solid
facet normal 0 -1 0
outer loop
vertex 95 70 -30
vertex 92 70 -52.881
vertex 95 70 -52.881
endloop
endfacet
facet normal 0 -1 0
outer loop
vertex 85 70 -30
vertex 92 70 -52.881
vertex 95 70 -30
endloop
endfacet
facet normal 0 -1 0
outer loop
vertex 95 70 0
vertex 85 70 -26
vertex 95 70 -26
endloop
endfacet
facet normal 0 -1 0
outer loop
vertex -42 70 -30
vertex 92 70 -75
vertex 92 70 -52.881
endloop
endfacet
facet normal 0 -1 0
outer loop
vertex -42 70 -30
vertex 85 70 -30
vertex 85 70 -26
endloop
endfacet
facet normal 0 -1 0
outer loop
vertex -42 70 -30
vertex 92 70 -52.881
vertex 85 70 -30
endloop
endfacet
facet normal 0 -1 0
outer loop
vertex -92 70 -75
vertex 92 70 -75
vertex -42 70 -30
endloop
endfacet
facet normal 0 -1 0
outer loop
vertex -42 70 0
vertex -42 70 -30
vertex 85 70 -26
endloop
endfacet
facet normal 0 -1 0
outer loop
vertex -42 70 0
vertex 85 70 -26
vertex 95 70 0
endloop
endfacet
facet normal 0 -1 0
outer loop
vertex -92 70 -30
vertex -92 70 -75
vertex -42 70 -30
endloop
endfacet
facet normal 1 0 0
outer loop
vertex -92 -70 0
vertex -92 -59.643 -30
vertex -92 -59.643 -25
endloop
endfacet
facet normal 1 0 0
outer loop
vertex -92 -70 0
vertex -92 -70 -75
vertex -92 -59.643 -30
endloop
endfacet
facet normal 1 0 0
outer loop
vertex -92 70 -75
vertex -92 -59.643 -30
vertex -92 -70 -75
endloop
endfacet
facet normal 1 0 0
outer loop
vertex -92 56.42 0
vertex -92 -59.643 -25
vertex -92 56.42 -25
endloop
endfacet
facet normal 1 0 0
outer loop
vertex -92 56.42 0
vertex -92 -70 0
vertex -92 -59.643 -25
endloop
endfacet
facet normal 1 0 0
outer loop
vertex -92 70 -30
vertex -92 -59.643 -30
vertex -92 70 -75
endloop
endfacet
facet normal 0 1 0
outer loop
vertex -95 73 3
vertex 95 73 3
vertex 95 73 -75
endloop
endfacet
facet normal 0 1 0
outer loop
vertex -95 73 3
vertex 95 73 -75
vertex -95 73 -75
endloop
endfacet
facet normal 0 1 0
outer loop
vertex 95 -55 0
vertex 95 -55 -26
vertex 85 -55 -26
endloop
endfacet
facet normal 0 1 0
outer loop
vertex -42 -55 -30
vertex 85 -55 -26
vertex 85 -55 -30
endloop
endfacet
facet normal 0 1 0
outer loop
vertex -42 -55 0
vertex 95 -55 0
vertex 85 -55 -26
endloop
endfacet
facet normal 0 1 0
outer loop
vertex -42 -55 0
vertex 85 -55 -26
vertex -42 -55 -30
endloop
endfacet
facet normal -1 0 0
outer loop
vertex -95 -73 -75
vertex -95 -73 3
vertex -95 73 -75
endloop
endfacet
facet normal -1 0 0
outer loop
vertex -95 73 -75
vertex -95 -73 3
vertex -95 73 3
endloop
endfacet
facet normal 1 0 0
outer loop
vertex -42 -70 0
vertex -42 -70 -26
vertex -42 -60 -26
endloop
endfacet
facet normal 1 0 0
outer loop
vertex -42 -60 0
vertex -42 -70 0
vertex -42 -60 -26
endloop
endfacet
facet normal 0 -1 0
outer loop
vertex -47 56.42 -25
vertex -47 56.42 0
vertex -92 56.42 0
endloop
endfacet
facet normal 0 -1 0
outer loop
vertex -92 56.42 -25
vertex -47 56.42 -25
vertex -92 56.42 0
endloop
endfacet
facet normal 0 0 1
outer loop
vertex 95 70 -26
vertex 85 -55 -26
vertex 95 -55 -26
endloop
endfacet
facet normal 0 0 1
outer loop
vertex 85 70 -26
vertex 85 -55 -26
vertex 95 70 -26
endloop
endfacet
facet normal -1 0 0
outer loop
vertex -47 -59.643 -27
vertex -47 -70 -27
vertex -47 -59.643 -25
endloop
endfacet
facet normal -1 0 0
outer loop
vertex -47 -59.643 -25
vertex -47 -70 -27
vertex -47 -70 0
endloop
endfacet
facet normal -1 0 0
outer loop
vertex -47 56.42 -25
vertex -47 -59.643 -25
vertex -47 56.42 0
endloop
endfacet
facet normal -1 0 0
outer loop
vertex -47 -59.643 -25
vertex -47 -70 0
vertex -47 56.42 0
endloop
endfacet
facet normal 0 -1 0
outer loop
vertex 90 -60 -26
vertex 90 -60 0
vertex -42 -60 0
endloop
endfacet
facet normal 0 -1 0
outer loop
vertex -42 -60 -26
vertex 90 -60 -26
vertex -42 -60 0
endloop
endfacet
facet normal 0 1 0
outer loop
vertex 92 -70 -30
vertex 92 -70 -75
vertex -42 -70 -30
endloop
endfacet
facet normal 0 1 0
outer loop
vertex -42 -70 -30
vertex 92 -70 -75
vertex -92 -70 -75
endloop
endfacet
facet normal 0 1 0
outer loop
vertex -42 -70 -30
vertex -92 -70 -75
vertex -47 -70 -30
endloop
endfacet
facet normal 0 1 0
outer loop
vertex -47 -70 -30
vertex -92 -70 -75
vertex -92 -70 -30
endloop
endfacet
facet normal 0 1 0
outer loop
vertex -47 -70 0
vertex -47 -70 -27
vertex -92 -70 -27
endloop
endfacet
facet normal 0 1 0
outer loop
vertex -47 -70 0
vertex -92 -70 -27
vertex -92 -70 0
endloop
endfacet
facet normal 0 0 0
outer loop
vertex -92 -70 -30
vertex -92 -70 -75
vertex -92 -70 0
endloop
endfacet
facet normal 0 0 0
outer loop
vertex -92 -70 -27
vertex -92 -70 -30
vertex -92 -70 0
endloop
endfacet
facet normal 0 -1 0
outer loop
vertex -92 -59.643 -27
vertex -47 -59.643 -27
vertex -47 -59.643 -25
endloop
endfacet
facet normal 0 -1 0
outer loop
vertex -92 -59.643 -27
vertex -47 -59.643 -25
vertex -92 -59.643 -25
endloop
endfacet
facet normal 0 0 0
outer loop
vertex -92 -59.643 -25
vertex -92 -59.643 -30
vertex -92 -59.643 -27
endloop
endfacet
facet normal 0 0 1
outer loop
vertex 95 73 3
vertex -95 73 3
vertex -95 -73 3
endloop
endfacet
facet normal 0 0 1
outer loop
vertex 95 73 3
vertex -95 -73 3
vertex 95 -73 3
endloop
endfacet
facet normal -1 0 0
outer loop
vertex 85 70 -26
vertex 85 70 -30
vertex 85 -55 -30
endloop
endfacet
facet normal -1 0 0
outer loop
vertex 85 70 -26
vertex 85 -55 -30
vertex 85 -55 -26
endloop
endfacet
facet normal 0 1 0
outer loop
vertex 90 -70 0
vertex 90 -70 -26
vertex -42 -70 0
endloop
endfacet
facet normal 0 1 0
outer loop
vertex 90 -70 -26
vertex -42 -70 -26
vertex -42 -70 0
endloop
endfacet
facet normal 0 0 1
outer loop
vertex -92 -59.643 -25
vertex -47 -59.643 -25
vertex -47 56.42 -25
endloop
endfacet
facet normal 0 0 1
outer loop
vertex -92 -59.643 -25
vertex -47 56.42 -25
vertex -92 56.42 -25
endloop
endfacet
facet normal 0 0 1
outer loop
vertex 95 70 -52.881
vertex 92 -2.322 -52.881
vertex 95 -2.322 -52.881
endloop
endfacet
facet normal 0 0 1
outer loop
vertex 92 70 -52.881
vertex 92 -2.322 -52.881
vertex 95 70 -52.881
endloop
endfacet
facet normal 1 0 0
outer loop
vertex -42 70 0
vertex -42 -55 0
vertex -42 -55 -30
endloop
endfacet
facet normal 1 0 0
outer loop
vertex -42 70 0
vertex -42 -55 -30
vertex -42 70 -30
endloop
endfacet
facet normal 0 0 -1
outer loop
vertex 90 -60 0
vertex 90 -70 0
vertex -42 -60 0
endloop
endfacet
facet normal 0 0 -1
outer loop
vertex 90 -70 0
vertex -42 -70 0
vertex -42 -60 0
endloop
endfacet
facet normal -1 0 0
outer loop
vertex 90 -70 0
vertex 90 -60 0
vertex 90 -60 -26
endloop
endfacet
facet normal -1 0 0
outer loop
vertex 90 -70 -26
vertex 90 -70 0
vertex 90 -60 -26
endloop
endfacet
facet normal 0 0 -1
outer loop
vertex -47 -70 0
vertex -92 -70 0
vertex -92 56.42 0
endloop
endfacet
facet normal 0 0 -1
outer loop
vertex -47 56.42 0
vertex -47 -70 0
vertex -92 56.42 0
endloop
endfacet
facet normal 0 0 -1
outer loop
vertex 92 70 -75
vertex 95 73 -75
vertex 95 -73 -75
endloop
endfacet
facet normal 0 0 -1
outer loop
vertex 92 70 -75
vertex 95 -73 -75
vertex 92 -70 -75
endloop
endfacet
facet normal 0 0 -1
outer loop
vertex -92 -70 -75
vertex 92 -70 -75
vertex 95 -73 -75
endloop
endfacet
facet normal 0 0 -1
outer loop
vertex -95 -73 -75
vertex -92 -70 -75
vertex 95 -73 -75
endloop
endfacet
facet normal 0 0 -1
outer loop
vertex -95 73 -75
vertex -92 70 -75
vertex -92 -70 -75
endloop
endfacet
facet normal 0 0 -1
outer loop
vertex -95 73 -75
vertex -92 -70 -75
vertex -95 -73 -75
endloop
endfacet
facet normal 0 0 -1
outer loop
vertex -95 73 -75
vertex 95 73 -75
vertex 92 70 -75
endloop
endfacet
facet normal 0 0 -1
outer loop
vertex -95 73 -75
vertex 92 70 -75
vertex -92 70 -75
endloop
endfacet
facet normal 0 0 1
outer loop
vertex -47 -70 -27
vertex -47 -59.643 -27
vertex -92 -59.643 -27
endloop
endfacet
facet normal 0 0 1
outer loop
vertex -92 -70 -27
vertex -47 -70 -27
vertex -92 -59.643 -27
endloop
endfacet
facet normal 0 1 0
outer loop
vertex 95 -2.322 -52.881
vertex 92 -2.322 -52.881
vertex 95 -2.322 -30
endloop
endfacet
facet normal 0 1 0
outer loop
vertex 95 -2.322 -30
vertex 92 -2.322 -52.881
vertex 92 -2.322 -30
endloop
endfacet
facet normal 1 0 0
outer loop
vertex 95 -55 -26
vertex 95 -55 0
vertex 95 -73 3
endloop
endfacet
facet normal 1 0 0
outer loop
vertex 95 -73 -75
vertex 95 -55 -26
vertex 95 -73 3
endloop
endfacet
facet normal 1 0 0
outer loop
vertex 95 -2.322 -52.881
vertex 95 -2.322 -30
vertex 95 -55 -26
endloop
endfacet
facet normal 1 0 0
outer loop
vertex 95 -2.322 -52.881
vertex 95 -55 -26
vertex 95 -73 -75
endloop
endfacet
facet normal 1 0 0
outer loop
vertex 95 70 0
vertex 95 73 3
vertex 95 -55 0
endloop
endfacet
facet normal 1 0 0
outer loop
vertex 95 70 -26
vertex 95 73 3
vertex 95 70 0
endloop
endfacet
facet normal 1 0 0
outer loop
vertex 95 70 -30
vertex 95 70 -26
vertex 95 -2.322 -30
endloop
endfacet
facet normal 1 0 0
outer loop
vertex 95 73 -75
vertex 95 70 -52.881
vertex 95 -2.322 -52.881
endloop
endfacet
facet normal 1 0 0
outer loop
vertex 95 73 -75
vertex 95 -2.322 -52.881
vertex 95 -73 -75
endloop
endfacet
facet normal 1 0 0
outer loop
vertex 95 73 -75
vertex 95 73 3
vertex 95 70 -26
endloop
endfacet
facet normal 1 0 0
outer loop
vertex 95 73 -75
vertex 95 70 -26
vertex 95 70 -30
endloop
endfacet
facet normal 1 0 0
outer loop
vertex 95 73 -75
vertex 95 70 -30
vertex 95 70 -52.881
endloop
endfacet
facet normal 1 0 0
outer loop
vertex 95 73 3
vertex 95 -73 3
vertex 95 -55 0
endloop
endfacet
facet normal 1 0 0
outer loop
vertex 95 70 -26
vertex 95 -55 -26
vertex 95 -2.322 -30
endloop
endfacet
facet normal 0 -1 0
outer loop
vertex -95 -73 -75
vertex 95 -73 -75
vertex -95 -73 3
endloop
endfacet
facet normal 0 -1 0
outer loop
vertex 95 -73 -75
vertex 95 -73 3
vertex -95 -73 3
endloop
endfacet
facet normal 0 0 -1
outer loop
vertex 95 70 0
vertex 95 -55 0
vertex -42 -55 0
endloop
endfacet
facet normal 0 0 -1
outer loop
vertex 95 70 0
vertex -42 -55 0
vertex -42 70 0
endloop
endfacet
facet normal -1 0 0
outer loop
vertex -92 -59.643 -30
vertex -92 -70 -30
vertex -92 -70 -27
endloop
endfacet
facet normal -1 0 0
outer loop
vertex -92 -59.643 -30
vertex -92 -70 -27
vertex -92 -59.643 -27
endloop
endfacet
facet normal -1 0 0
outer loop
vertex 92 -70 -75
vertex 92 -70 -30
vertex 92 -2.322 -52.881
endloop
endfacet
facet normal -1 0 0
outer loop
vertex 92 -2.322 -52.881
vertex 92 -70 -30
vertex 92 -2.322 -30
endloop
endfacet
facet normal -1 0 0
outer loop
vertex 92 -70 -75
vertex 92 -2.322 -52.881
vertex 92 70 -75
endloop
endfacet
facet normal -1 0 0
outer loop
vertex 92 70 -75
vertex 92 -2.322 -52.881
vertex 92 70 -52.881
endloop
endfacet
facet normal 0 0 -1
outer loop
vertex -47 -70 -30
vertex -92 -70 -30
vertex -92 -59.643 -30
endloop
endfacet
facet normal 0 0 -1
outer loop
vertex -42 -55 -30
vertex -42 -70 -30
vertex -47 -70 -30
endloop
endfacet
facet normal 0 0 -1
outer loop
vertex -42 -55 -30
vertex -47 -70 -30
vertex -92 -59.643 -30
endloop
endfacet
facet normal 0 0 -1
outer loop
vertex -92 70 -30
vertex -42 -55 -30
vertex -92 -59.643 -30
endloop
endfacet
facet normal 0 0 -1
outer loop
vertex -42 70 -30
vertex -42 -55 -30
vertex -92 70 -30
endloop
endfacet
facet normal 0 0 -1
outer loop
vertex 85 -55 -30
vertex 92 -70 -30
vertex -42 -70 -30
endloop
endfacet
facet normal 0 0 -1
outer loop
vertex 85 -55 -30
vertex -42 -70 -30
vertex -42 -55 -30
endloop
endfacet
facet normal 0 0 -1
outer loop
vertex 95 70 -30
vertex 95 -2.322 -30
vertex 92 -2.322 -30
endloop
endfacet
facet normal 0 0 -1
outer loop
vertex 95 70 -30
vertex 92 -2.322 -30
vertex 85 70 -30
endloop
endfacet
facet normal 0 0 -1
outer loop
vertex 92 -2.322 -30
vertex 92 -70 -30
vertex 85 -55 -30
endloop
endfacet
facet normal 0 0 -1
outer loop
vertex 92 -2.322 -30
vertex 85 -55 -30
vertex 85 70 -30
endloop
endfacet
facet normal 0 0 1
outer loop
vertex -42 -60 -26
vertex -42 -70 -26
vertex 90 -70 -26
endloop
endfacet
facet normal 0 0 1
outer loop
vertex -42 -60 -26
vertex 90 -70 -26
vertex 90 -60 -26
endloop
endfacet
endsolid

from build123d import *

# Parameters (mm, degrees)
ESQUISSE3_W             = 190
ESQUISSE3_H             = 146
BOSS_EXTRU_3_DEPTH      = 3
ESQUISSE4_W             = 190
ESQUISSE4_H             = 3
BOSS_EXTRU_4_DEPTH      = 75
ESQUISSE5_W             = 190
ESQUISSE5_H             = 3
BOSS_EXTRU_5_DEPTH      = 75
ESQUISSE6_W             = 3
ESQUISSE6_H             = 140
BOSS_EXTRU_6_DEPTH      = 75
ESQUISSE7_W             = 3
ESQUISSE7_H             = 140
BOSS_EXTRU_7_DEPTH      = 75
ESQUISSE8_W             = 26
ESQUISSE8_H             = 140
ENL_V_MAT_EXTRU_1_DEPTH = 5
ESQUISSE9_W             = 50
ESQUISSE9_H             = 13.580457403
BOSS_EXTRU_8_DEPTH      = 30
ESQUISSE10_W            = 5
ESQUISSE10_H            = 126.419542597
BOSS_EXTRU_9_DEPTH      = 30
ESQUISSE12_W            = 45
ESQUISSE12_H            = 116.062132341
BOSS_EXTRU_10_DEPTH     = 5
ESQUISSE13_W            = 137
ESQUISSE13_H            = 5
BOSS_EXTRU_11_DEPTH     = 30
ESQUISSE14_W            = 134
ESQUISSE14_H            = 10
BOSS_EXTRU_12_DEPTH     = 4
ESQUISSE15_W            = 26
ESQUISSE15_H            = 10
BOSS_EXTRU_13_DEPTH     = 5
ESQUISSE16_W            = 4
ESQUISSE16_H            = 125
BOSS_EXTRU_14_DEPTH     = 7
ESQUISSE17_W            = 22.881021534
ESQUISSE17_H            = 72.322375242
ENL_V_MAT_EXTRU_2_DEPTH = 3
ESQUISSE19_W            = 44.999866494
ESQUISSE19_H            = 10.48475091
BOSS_EXTRU_15_DEPTH     = 3


with BuildPart() as part:
    # Esquisse3 → Boss.-Extru.3 (new body)
    with BuildSketch(Plane.XY):
        Rectangle(ESQUISSE3_W, ESQUISSE3_H)
    extrude(amount=BOSS_EXTRU_3_DEPTH)

    # Esquisse4 → Boss.-Extru.4 (add)
    with BuildSketch(Plane(origin=(0, 0, 0), x_dir=(-1, 0, 0), z_dir=(0, 0, -1))):
        with Locations((0, -71.5)):
            Rectangle(ESQUISSE4_W, ESQUISSE4_H)
    extrude(amount=BOSS_EXTRU_4_DEPTH)

    # Esquisse5 → Boss.-Extru.5 (add)
    with BuildSketch(Plane(origin=(0, 0, 0), x_dir=(-1, 0, 0), z_dir=(0, 0, -1))):
        with Locations((0, 71.5)):
            Rectangle(ESQUISSE5_W, ESQUISSE5_H)
    extrude(amount=BOSS_EXTRU_5_DEPTH)

    # Esquisse6 → Boss.-Extru.6 (add)
    with BuildSketch(Plane(origin=(0, 0, 0), x_dir=(-1, 0, 0), z_dir=(0, 0, -1))):
        with Locations((93.5, 0)):
            Rectangle(ESQUISSE6_W, ESQUISSE6_H)
    extrude(amount=BOSS_EXTRU_6_DEPTH)

    # Esquisse7 → Boss.-Extru.7 (add)
    with BuildSketch(Plane(origin=(0, 0, 0), x_dir=(-1, 0, 0), z_dir=(0, 0, -1))):
        with Locations((-93.5, 0)):
            Rectangle(ESQUISSE7_W, ESQUISSE7_H)
    extrude(amount=BOSS_EXTRU_7_DEPTH)

    # Esquisse8 → Enlèv. mat.-Extru.1 (cut)
    with BuildSketch(Plane.ZY.offset(-92)):
        with Locations((-13, 0)):
            Rectangle(ESQUISSE8_W, ESQUISSE8_H)
    extrude(amount=-ENL_V_MAT_EXTRU_1_DEPTH, mode=Mode.SUBTRACT)

    # Esquisse9 → Boss.-Extru.8 (add)
    with BuildSketch(Plane(origin=(0, 0, 0), x_dir=(-1, 0, 0), z_dir=(0, 0, -1))):
        with Locations((67, 63.209771299)):
            Rectangle(ESQUISSE9_W, ESQUISSE9_H)
    extrude(amount=BOSS_EXTRU_8_DEPTH)

    # Esquisse10 → Boss.-Extru.9 (add)
    with BuildSketch(Plane(origin=(0, 0, 0), x_dir=(-1, 0, 0), z_dir=(0, 0, -1))):
        with Locations((44.5, -6.790228701)):
            Rectangle(ESQUISSE10_W, ESQUISSE10_H)
    extrude(amount=BOSS_EXTRU_9_DEPTH)

    # Esquisse12 → Boss.-Extru.10 (add)
    with BuildSketch(Plane(origin=(0, 0, -30), x_dir=(-1, 0, 0), z_dir=(0, 0, -1))):
        with Locations((69.5, -1.611523574)):
            Rectangle(ESQUISSE12_W, ESQUISSE12_H)
    extrude(amount=-BOSS_EXTRU_10_DEPTH)

    # Esquisse13 → Boss.-Extru.11 (add)
    with BuildSketch(Plane(origin=(0, 0, 0), x_dir=(-1, 0, 0), z_dir=(0, 0, -1))):
        with Locations((-26.5, -57.5)):
            Rectangle(ESQUISSE13_W, ESQUISSE13_H)
    extrude(amount=BOSS_EXTRU_11_DEPTH)

    # Esquisse14 → Boss.-Extru.12 (add)
    with BuildSketch(Plane(origin=(0, 0, -30), x_dir=(-1, 0, 0), z_dir=(0, 0, -1))):
        with Locations((-25, -65)):
            Rectangle(ESQUISSE14_W, ESQUISSE14_H)
    extrude(amount=-BOSS_EXTRU_12_DEPTH)

    # Esquisse15 → Boss.-Extru.13 (add)
    with BuildSketch(Plane(origin=(95, 0, 0), x_dir=(0, 0, -1), z_dir=(1, 0, 0))):
        with Locations((13, -65)):
            Rectangle(ESQUISSE15_W, ESQUISSE15_H)
    extrude(amount=-BOSS_EXTRU_13_DEPTH)

    # Esquisse16 → Boss.-Extru.14 (add)
    with BuildSketch(Plane.ZY.offset(-92)):
        with Locations((-28, 7.5)):
            Rectangle(ESQUISSE16_W, ESQUISSE16_H)
    extrude(amount=BOSS_EXTRU_14_DEPTH)

    # Esquisse17 → Enlèv. mat.-Extru.2 (cut)
    with BuildSketch(Plane.ZY.offset(-92)):
        with Locations((-41.440510767, 33.838812379)):
            Rectangle(ESQUISSE17_W, ESQUISSE17_H)
    extrude(amount=-ENL_V_MAT_EXTRU_2_DEPTH, mode=Mode.SUBTRACT)

    # Esquisse19 → Boss.-Extru.15 (add)
    with BuildSketch(Plane(origin=(0, 0, -30), x_dir=(-1, 0, 0), z_dir=(0, 0, -1))):
        with Locations((69.499933247, -64.884965199)):
            Rectangle(ESQUISSE19_W, ESQUISSE19_H)
    extrude(amount=-BOSS_EXTRU_15_DEPTH)


solid = part.part
